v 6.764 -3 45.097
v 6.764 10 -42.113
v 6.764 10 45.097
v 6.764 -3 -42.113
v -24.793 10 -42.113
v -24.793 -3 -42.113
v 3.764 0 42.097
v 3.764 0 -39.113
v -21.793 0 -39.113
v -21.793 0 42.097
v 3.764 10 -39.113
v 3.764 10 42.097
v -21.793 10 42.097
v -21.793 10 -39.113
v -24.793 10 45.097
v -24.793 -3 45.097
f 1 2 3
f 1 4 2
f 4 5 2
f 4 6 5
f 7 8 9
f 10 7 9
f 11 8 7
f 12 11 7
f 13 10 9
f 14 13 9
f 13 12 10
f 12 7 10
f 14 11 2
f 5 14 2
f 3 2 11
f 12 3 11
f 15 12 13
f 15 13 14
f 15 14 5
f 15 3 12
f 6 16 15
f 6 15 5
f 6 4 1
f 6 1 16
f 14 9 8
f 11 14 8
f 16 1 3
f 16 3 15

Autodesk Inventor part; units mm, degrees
ref_plane "YZ Plane" through (0, 0, 0) normal (1, 0, 0) x (0, 1, 0)
ref_plane "XZ Plane" through (0, 0, 0) normal (0, 1, 0) x (-1, 0, 0)
ref_plane "XY Plane" through (0, 0, 0) normal (0, 0, 1) x (1, 0, 0)
sketch "Sketch1" plane through (0, 0, 0) normal (0, 1, 0) x (-1, 0, 0)
  line L0 (24.7933, -42.1134) -> (-6.7642, -42.1134)
  line L1 (-6.7642, -42.1134) -> (-6.7642, 45.097)
  line L2 (-6.7642, 45.097) -> (24.7933, 45.097)
  line L3 (24.7933, 45.097) -> (24.7933, -42.1134)
  line L4 (21.7933, -39.1134) -> (-3.7642, -39.1134)
  line L5 (-3.7642, -39.1134) -> (-3.7642, 42.097)
  line L6 (-3.7642, 42.097) -> (21.7933, 42.097)
  line L7 (21.7933, 42.097) -> (21.7933, -39.1134)
  point P0 (0, 0)
  dimension "d0" = 3
  dimension "d1" = 3
  dimension "d2" = 3
  dimension "d3" = 3
extrude "Extrusion2" add sketch "Sketch1" against normal blind 3 contours L0 L1 L2 L3 | L4 L5 L6 L7
extrude "Extrusion3" add sketch "Sketch1" along normal blind 10
properties part number "housing_bottom"
